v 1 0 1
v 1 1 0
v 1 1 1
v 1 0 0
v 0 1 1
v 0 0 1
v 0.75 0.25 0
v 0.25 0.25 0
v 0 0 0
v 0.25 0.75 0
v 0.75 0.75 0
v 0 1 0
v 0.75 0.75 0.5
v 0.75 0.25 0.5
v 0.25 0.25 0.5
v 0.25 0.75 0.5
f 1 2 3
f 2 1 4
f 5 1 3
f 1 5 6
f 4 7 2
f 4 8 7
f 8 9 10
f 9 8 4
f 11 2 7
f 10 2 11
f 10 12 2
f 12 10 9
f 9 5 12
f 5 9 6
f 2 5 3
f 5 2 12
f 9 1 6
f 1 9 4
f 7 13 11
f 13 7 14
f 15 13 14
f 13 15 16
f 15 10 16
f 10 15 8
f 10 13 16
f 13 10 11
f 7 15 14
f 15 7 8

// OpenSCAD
difference() {
   cube();
   translate([0.25,0.25,0]) scale(0.5) cube();
}
